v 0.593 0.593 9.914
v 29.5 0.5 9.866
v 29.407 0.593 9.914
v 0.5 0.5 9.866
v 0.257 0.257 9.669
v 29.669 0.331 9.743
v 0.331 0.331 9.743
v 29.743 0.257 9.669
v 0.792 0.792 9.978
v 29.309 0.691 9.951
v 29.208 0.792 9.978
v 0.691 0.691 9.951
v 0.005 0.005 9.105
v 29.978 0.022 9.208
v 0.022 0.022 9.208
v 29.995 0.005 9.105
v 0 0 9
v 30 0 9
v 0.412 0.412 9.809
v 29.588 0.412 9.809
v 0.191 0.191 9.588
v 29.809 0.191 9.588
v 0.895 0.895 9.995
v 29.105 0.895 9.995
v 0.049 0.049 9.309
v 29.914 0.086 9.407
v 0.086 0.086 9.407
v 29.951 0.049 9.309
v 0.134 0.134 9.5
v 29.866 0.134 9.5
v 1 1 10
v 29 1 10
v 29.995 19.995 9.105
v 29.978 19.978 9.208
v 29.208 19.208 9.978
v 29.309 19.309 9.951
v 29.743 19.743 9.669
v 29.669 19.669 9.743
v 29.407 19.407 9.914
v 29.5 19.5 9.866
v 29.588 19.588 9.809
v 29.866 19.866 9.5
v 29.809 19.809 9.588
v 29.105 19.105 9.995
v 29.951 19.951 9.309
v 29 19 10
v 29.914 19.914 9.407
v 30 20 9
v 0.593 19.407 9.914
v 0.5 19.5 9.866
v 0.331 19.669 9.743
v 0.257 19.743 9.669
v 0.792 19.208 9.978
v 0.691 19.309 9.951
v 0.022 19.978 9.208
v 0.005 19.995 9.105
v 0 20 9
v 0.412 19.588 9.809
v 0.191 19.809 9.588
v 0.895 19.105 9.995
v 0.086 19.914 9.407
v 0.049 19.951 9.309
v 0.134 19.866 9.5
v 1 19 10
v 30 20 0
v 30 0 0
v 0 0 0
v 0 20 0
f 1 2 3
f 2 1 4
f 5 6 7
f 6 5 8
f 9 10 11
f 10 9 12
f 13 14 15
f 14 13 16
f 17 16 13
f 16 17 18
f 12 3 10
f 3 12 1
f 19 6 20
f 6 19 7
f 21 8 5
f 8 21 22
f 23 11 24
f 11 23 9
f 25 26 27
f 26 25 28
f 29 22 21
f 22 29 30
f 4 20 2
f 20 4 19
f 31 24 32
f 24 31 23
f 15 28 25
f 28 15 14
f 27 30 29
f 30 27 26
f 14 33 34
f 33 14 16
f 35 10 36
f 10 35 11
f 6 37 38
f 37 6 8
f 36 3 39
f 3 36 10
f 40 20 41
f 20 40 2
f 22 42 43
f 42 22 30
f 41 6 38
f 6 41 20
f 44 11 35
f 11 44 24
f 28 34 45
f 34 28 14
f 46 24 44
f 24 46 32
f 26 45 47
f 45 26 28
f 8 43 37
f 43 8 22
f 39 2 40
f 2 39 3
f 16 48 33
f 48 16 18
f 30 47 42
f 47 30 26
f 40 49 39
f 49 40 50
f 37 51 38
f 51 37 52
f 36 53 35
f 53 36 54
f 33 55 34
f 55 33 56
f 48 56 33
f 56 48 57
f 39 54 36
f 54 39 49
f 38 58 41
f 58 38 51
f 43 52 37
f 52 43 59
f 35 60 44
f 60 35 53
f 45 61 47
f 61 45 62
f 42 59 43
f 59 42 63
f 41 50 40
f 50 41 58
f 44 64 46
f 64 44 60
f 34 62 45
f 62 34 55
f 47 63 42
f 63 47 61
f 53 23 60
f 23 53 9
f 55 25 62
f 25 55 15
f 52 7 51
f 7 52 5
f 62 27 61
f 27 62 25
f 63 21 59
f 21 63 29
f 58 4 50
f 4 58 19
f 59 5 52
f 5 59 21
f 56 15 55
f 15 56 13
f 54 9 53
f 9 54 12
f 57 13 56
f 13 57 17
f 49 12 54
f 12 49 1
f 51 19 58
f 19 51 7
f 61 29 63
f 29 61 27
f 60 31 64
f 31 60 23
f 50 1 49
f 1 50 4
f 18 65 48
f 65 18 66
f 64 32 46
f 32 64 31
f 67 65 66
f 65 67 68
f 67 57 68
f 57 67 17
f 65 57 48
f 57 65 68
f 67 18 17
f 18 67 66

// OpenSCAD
/*

Create Chamfers For Cubes

Most important modules:

    chamfer_edge(cube_size, radius, edge)
    chamfered_cube(cube_size, radius, edges=[0:11])

Most important is to understand the numbering of the edges:


          +--------- 10 ---------+
         /|                     /|
        / |                    / |
      11  |                   9  |
      /   |                  /   |
     /    |                 /    |
    +---------- 8 ---------+     |
    |     |                |     |
    |     |                |     |
    |     7                |     6
    |     |                |     |
    |     |                |     |
    |     |                |     |
    |     |                |     |
    |     |                |     |
    4     |                5     |
    |     |                |     |
    |     |                |     |
    |     +---------– 2 ---|-----+
    |    /                 |    /
    |   /                  |   /
    |  3                   |  1
    | /                    | /
    |/                     |/
    +---------- 0 ---------+


The call to `chamfer_edge([10, 20, 30], 1, 8)` will give you a _negative_
chamfer for the upper front side of a 10 x 20 x 30 cube with a radius of 1.

A call to `chamfered_cube([10, 20, 30], 1, edges=[8:11])` will give you a
cube with the size of 10 x 20 x 30, the upper side will have chamfers.

*/

CHAMFER_EDGES = [
    [[1, 0, 0], [  0, 270,   0], 0],
    [[1, 1, 0], [ 90, 270,   0], 1],
    [[0, 1, 0], [  0, 270, 180], 0],
    [[0, 1, 0], [ 90,   0,   0], 1],

    [[0, 0, 0], [  0,   0,   0], 2],
    [[1, 0, 0], [  0,   0,  90], 2],
    [[1, 1, 0], [  0,   0, 180], 2],
    [[0, 1, 0], [  0,   0, 270], 2],

    [[0, 0, 1], [  0,  90,   0], 0],
    [[1, 0, 1], [270,  90,   0], 1],
    [[1, 1, 1], [  0,  90, 180], 0],
    [[0, 0, 1], [270,   0,   0], 1],
];

_JOIN = 0.1;

function multiply_vector(v1, v2) =
    len(v1) == len(v2) ?
    [for (i=[0:(len(v1)-1)]) v1[i] * v2[i]] :
    undef;


module basic_chamfer(length, radius) {
    /* returns a basic chamfer

    an extra margin is already added in all dimensions and positioned
    accordingly.
    */
    join_length = length + 2 * _JOIN;
    difference() {
        translate([-_JOIN, -_JOIN, -_JOIN]) cube([radius + _JOIN, radius + _JOIN, join_length]);
        translate([radius, radius, -2 * _JOIN]) cylinder(join_length + 2 * _JOIN, d=radius * 2, $fn=60);
    }
}

module chamfer_edge(cube_size, radius, edge) {
    /* returns one chamfer for an edge of an cube */
    translation_vektor = CHAMFER_EDGES[edge][0];
    rotation = CHAMFER_EDGES[edge][1];
    length_index = CHAMFER_EDGES[edge][2];

    length = cube_size[length_index];
    translation = multiply_vector(cube_size, translation_vektor);

    translate(translation) rotate(rotation) basic_chamfer(length, radius);
}

module chamfered_cube(cube_size, radius, edges=[0:11]) {
    /* returns a cube with chamfers applied to the specified edges */
    difference() {
        cube(cube_size);
        for (edge=edges) {
            chamfer_edge(cube_size, radius, edge);
        }
    }
}


chamfered_cube([30, 20, 10], radius=1, edges=[8:11]);
